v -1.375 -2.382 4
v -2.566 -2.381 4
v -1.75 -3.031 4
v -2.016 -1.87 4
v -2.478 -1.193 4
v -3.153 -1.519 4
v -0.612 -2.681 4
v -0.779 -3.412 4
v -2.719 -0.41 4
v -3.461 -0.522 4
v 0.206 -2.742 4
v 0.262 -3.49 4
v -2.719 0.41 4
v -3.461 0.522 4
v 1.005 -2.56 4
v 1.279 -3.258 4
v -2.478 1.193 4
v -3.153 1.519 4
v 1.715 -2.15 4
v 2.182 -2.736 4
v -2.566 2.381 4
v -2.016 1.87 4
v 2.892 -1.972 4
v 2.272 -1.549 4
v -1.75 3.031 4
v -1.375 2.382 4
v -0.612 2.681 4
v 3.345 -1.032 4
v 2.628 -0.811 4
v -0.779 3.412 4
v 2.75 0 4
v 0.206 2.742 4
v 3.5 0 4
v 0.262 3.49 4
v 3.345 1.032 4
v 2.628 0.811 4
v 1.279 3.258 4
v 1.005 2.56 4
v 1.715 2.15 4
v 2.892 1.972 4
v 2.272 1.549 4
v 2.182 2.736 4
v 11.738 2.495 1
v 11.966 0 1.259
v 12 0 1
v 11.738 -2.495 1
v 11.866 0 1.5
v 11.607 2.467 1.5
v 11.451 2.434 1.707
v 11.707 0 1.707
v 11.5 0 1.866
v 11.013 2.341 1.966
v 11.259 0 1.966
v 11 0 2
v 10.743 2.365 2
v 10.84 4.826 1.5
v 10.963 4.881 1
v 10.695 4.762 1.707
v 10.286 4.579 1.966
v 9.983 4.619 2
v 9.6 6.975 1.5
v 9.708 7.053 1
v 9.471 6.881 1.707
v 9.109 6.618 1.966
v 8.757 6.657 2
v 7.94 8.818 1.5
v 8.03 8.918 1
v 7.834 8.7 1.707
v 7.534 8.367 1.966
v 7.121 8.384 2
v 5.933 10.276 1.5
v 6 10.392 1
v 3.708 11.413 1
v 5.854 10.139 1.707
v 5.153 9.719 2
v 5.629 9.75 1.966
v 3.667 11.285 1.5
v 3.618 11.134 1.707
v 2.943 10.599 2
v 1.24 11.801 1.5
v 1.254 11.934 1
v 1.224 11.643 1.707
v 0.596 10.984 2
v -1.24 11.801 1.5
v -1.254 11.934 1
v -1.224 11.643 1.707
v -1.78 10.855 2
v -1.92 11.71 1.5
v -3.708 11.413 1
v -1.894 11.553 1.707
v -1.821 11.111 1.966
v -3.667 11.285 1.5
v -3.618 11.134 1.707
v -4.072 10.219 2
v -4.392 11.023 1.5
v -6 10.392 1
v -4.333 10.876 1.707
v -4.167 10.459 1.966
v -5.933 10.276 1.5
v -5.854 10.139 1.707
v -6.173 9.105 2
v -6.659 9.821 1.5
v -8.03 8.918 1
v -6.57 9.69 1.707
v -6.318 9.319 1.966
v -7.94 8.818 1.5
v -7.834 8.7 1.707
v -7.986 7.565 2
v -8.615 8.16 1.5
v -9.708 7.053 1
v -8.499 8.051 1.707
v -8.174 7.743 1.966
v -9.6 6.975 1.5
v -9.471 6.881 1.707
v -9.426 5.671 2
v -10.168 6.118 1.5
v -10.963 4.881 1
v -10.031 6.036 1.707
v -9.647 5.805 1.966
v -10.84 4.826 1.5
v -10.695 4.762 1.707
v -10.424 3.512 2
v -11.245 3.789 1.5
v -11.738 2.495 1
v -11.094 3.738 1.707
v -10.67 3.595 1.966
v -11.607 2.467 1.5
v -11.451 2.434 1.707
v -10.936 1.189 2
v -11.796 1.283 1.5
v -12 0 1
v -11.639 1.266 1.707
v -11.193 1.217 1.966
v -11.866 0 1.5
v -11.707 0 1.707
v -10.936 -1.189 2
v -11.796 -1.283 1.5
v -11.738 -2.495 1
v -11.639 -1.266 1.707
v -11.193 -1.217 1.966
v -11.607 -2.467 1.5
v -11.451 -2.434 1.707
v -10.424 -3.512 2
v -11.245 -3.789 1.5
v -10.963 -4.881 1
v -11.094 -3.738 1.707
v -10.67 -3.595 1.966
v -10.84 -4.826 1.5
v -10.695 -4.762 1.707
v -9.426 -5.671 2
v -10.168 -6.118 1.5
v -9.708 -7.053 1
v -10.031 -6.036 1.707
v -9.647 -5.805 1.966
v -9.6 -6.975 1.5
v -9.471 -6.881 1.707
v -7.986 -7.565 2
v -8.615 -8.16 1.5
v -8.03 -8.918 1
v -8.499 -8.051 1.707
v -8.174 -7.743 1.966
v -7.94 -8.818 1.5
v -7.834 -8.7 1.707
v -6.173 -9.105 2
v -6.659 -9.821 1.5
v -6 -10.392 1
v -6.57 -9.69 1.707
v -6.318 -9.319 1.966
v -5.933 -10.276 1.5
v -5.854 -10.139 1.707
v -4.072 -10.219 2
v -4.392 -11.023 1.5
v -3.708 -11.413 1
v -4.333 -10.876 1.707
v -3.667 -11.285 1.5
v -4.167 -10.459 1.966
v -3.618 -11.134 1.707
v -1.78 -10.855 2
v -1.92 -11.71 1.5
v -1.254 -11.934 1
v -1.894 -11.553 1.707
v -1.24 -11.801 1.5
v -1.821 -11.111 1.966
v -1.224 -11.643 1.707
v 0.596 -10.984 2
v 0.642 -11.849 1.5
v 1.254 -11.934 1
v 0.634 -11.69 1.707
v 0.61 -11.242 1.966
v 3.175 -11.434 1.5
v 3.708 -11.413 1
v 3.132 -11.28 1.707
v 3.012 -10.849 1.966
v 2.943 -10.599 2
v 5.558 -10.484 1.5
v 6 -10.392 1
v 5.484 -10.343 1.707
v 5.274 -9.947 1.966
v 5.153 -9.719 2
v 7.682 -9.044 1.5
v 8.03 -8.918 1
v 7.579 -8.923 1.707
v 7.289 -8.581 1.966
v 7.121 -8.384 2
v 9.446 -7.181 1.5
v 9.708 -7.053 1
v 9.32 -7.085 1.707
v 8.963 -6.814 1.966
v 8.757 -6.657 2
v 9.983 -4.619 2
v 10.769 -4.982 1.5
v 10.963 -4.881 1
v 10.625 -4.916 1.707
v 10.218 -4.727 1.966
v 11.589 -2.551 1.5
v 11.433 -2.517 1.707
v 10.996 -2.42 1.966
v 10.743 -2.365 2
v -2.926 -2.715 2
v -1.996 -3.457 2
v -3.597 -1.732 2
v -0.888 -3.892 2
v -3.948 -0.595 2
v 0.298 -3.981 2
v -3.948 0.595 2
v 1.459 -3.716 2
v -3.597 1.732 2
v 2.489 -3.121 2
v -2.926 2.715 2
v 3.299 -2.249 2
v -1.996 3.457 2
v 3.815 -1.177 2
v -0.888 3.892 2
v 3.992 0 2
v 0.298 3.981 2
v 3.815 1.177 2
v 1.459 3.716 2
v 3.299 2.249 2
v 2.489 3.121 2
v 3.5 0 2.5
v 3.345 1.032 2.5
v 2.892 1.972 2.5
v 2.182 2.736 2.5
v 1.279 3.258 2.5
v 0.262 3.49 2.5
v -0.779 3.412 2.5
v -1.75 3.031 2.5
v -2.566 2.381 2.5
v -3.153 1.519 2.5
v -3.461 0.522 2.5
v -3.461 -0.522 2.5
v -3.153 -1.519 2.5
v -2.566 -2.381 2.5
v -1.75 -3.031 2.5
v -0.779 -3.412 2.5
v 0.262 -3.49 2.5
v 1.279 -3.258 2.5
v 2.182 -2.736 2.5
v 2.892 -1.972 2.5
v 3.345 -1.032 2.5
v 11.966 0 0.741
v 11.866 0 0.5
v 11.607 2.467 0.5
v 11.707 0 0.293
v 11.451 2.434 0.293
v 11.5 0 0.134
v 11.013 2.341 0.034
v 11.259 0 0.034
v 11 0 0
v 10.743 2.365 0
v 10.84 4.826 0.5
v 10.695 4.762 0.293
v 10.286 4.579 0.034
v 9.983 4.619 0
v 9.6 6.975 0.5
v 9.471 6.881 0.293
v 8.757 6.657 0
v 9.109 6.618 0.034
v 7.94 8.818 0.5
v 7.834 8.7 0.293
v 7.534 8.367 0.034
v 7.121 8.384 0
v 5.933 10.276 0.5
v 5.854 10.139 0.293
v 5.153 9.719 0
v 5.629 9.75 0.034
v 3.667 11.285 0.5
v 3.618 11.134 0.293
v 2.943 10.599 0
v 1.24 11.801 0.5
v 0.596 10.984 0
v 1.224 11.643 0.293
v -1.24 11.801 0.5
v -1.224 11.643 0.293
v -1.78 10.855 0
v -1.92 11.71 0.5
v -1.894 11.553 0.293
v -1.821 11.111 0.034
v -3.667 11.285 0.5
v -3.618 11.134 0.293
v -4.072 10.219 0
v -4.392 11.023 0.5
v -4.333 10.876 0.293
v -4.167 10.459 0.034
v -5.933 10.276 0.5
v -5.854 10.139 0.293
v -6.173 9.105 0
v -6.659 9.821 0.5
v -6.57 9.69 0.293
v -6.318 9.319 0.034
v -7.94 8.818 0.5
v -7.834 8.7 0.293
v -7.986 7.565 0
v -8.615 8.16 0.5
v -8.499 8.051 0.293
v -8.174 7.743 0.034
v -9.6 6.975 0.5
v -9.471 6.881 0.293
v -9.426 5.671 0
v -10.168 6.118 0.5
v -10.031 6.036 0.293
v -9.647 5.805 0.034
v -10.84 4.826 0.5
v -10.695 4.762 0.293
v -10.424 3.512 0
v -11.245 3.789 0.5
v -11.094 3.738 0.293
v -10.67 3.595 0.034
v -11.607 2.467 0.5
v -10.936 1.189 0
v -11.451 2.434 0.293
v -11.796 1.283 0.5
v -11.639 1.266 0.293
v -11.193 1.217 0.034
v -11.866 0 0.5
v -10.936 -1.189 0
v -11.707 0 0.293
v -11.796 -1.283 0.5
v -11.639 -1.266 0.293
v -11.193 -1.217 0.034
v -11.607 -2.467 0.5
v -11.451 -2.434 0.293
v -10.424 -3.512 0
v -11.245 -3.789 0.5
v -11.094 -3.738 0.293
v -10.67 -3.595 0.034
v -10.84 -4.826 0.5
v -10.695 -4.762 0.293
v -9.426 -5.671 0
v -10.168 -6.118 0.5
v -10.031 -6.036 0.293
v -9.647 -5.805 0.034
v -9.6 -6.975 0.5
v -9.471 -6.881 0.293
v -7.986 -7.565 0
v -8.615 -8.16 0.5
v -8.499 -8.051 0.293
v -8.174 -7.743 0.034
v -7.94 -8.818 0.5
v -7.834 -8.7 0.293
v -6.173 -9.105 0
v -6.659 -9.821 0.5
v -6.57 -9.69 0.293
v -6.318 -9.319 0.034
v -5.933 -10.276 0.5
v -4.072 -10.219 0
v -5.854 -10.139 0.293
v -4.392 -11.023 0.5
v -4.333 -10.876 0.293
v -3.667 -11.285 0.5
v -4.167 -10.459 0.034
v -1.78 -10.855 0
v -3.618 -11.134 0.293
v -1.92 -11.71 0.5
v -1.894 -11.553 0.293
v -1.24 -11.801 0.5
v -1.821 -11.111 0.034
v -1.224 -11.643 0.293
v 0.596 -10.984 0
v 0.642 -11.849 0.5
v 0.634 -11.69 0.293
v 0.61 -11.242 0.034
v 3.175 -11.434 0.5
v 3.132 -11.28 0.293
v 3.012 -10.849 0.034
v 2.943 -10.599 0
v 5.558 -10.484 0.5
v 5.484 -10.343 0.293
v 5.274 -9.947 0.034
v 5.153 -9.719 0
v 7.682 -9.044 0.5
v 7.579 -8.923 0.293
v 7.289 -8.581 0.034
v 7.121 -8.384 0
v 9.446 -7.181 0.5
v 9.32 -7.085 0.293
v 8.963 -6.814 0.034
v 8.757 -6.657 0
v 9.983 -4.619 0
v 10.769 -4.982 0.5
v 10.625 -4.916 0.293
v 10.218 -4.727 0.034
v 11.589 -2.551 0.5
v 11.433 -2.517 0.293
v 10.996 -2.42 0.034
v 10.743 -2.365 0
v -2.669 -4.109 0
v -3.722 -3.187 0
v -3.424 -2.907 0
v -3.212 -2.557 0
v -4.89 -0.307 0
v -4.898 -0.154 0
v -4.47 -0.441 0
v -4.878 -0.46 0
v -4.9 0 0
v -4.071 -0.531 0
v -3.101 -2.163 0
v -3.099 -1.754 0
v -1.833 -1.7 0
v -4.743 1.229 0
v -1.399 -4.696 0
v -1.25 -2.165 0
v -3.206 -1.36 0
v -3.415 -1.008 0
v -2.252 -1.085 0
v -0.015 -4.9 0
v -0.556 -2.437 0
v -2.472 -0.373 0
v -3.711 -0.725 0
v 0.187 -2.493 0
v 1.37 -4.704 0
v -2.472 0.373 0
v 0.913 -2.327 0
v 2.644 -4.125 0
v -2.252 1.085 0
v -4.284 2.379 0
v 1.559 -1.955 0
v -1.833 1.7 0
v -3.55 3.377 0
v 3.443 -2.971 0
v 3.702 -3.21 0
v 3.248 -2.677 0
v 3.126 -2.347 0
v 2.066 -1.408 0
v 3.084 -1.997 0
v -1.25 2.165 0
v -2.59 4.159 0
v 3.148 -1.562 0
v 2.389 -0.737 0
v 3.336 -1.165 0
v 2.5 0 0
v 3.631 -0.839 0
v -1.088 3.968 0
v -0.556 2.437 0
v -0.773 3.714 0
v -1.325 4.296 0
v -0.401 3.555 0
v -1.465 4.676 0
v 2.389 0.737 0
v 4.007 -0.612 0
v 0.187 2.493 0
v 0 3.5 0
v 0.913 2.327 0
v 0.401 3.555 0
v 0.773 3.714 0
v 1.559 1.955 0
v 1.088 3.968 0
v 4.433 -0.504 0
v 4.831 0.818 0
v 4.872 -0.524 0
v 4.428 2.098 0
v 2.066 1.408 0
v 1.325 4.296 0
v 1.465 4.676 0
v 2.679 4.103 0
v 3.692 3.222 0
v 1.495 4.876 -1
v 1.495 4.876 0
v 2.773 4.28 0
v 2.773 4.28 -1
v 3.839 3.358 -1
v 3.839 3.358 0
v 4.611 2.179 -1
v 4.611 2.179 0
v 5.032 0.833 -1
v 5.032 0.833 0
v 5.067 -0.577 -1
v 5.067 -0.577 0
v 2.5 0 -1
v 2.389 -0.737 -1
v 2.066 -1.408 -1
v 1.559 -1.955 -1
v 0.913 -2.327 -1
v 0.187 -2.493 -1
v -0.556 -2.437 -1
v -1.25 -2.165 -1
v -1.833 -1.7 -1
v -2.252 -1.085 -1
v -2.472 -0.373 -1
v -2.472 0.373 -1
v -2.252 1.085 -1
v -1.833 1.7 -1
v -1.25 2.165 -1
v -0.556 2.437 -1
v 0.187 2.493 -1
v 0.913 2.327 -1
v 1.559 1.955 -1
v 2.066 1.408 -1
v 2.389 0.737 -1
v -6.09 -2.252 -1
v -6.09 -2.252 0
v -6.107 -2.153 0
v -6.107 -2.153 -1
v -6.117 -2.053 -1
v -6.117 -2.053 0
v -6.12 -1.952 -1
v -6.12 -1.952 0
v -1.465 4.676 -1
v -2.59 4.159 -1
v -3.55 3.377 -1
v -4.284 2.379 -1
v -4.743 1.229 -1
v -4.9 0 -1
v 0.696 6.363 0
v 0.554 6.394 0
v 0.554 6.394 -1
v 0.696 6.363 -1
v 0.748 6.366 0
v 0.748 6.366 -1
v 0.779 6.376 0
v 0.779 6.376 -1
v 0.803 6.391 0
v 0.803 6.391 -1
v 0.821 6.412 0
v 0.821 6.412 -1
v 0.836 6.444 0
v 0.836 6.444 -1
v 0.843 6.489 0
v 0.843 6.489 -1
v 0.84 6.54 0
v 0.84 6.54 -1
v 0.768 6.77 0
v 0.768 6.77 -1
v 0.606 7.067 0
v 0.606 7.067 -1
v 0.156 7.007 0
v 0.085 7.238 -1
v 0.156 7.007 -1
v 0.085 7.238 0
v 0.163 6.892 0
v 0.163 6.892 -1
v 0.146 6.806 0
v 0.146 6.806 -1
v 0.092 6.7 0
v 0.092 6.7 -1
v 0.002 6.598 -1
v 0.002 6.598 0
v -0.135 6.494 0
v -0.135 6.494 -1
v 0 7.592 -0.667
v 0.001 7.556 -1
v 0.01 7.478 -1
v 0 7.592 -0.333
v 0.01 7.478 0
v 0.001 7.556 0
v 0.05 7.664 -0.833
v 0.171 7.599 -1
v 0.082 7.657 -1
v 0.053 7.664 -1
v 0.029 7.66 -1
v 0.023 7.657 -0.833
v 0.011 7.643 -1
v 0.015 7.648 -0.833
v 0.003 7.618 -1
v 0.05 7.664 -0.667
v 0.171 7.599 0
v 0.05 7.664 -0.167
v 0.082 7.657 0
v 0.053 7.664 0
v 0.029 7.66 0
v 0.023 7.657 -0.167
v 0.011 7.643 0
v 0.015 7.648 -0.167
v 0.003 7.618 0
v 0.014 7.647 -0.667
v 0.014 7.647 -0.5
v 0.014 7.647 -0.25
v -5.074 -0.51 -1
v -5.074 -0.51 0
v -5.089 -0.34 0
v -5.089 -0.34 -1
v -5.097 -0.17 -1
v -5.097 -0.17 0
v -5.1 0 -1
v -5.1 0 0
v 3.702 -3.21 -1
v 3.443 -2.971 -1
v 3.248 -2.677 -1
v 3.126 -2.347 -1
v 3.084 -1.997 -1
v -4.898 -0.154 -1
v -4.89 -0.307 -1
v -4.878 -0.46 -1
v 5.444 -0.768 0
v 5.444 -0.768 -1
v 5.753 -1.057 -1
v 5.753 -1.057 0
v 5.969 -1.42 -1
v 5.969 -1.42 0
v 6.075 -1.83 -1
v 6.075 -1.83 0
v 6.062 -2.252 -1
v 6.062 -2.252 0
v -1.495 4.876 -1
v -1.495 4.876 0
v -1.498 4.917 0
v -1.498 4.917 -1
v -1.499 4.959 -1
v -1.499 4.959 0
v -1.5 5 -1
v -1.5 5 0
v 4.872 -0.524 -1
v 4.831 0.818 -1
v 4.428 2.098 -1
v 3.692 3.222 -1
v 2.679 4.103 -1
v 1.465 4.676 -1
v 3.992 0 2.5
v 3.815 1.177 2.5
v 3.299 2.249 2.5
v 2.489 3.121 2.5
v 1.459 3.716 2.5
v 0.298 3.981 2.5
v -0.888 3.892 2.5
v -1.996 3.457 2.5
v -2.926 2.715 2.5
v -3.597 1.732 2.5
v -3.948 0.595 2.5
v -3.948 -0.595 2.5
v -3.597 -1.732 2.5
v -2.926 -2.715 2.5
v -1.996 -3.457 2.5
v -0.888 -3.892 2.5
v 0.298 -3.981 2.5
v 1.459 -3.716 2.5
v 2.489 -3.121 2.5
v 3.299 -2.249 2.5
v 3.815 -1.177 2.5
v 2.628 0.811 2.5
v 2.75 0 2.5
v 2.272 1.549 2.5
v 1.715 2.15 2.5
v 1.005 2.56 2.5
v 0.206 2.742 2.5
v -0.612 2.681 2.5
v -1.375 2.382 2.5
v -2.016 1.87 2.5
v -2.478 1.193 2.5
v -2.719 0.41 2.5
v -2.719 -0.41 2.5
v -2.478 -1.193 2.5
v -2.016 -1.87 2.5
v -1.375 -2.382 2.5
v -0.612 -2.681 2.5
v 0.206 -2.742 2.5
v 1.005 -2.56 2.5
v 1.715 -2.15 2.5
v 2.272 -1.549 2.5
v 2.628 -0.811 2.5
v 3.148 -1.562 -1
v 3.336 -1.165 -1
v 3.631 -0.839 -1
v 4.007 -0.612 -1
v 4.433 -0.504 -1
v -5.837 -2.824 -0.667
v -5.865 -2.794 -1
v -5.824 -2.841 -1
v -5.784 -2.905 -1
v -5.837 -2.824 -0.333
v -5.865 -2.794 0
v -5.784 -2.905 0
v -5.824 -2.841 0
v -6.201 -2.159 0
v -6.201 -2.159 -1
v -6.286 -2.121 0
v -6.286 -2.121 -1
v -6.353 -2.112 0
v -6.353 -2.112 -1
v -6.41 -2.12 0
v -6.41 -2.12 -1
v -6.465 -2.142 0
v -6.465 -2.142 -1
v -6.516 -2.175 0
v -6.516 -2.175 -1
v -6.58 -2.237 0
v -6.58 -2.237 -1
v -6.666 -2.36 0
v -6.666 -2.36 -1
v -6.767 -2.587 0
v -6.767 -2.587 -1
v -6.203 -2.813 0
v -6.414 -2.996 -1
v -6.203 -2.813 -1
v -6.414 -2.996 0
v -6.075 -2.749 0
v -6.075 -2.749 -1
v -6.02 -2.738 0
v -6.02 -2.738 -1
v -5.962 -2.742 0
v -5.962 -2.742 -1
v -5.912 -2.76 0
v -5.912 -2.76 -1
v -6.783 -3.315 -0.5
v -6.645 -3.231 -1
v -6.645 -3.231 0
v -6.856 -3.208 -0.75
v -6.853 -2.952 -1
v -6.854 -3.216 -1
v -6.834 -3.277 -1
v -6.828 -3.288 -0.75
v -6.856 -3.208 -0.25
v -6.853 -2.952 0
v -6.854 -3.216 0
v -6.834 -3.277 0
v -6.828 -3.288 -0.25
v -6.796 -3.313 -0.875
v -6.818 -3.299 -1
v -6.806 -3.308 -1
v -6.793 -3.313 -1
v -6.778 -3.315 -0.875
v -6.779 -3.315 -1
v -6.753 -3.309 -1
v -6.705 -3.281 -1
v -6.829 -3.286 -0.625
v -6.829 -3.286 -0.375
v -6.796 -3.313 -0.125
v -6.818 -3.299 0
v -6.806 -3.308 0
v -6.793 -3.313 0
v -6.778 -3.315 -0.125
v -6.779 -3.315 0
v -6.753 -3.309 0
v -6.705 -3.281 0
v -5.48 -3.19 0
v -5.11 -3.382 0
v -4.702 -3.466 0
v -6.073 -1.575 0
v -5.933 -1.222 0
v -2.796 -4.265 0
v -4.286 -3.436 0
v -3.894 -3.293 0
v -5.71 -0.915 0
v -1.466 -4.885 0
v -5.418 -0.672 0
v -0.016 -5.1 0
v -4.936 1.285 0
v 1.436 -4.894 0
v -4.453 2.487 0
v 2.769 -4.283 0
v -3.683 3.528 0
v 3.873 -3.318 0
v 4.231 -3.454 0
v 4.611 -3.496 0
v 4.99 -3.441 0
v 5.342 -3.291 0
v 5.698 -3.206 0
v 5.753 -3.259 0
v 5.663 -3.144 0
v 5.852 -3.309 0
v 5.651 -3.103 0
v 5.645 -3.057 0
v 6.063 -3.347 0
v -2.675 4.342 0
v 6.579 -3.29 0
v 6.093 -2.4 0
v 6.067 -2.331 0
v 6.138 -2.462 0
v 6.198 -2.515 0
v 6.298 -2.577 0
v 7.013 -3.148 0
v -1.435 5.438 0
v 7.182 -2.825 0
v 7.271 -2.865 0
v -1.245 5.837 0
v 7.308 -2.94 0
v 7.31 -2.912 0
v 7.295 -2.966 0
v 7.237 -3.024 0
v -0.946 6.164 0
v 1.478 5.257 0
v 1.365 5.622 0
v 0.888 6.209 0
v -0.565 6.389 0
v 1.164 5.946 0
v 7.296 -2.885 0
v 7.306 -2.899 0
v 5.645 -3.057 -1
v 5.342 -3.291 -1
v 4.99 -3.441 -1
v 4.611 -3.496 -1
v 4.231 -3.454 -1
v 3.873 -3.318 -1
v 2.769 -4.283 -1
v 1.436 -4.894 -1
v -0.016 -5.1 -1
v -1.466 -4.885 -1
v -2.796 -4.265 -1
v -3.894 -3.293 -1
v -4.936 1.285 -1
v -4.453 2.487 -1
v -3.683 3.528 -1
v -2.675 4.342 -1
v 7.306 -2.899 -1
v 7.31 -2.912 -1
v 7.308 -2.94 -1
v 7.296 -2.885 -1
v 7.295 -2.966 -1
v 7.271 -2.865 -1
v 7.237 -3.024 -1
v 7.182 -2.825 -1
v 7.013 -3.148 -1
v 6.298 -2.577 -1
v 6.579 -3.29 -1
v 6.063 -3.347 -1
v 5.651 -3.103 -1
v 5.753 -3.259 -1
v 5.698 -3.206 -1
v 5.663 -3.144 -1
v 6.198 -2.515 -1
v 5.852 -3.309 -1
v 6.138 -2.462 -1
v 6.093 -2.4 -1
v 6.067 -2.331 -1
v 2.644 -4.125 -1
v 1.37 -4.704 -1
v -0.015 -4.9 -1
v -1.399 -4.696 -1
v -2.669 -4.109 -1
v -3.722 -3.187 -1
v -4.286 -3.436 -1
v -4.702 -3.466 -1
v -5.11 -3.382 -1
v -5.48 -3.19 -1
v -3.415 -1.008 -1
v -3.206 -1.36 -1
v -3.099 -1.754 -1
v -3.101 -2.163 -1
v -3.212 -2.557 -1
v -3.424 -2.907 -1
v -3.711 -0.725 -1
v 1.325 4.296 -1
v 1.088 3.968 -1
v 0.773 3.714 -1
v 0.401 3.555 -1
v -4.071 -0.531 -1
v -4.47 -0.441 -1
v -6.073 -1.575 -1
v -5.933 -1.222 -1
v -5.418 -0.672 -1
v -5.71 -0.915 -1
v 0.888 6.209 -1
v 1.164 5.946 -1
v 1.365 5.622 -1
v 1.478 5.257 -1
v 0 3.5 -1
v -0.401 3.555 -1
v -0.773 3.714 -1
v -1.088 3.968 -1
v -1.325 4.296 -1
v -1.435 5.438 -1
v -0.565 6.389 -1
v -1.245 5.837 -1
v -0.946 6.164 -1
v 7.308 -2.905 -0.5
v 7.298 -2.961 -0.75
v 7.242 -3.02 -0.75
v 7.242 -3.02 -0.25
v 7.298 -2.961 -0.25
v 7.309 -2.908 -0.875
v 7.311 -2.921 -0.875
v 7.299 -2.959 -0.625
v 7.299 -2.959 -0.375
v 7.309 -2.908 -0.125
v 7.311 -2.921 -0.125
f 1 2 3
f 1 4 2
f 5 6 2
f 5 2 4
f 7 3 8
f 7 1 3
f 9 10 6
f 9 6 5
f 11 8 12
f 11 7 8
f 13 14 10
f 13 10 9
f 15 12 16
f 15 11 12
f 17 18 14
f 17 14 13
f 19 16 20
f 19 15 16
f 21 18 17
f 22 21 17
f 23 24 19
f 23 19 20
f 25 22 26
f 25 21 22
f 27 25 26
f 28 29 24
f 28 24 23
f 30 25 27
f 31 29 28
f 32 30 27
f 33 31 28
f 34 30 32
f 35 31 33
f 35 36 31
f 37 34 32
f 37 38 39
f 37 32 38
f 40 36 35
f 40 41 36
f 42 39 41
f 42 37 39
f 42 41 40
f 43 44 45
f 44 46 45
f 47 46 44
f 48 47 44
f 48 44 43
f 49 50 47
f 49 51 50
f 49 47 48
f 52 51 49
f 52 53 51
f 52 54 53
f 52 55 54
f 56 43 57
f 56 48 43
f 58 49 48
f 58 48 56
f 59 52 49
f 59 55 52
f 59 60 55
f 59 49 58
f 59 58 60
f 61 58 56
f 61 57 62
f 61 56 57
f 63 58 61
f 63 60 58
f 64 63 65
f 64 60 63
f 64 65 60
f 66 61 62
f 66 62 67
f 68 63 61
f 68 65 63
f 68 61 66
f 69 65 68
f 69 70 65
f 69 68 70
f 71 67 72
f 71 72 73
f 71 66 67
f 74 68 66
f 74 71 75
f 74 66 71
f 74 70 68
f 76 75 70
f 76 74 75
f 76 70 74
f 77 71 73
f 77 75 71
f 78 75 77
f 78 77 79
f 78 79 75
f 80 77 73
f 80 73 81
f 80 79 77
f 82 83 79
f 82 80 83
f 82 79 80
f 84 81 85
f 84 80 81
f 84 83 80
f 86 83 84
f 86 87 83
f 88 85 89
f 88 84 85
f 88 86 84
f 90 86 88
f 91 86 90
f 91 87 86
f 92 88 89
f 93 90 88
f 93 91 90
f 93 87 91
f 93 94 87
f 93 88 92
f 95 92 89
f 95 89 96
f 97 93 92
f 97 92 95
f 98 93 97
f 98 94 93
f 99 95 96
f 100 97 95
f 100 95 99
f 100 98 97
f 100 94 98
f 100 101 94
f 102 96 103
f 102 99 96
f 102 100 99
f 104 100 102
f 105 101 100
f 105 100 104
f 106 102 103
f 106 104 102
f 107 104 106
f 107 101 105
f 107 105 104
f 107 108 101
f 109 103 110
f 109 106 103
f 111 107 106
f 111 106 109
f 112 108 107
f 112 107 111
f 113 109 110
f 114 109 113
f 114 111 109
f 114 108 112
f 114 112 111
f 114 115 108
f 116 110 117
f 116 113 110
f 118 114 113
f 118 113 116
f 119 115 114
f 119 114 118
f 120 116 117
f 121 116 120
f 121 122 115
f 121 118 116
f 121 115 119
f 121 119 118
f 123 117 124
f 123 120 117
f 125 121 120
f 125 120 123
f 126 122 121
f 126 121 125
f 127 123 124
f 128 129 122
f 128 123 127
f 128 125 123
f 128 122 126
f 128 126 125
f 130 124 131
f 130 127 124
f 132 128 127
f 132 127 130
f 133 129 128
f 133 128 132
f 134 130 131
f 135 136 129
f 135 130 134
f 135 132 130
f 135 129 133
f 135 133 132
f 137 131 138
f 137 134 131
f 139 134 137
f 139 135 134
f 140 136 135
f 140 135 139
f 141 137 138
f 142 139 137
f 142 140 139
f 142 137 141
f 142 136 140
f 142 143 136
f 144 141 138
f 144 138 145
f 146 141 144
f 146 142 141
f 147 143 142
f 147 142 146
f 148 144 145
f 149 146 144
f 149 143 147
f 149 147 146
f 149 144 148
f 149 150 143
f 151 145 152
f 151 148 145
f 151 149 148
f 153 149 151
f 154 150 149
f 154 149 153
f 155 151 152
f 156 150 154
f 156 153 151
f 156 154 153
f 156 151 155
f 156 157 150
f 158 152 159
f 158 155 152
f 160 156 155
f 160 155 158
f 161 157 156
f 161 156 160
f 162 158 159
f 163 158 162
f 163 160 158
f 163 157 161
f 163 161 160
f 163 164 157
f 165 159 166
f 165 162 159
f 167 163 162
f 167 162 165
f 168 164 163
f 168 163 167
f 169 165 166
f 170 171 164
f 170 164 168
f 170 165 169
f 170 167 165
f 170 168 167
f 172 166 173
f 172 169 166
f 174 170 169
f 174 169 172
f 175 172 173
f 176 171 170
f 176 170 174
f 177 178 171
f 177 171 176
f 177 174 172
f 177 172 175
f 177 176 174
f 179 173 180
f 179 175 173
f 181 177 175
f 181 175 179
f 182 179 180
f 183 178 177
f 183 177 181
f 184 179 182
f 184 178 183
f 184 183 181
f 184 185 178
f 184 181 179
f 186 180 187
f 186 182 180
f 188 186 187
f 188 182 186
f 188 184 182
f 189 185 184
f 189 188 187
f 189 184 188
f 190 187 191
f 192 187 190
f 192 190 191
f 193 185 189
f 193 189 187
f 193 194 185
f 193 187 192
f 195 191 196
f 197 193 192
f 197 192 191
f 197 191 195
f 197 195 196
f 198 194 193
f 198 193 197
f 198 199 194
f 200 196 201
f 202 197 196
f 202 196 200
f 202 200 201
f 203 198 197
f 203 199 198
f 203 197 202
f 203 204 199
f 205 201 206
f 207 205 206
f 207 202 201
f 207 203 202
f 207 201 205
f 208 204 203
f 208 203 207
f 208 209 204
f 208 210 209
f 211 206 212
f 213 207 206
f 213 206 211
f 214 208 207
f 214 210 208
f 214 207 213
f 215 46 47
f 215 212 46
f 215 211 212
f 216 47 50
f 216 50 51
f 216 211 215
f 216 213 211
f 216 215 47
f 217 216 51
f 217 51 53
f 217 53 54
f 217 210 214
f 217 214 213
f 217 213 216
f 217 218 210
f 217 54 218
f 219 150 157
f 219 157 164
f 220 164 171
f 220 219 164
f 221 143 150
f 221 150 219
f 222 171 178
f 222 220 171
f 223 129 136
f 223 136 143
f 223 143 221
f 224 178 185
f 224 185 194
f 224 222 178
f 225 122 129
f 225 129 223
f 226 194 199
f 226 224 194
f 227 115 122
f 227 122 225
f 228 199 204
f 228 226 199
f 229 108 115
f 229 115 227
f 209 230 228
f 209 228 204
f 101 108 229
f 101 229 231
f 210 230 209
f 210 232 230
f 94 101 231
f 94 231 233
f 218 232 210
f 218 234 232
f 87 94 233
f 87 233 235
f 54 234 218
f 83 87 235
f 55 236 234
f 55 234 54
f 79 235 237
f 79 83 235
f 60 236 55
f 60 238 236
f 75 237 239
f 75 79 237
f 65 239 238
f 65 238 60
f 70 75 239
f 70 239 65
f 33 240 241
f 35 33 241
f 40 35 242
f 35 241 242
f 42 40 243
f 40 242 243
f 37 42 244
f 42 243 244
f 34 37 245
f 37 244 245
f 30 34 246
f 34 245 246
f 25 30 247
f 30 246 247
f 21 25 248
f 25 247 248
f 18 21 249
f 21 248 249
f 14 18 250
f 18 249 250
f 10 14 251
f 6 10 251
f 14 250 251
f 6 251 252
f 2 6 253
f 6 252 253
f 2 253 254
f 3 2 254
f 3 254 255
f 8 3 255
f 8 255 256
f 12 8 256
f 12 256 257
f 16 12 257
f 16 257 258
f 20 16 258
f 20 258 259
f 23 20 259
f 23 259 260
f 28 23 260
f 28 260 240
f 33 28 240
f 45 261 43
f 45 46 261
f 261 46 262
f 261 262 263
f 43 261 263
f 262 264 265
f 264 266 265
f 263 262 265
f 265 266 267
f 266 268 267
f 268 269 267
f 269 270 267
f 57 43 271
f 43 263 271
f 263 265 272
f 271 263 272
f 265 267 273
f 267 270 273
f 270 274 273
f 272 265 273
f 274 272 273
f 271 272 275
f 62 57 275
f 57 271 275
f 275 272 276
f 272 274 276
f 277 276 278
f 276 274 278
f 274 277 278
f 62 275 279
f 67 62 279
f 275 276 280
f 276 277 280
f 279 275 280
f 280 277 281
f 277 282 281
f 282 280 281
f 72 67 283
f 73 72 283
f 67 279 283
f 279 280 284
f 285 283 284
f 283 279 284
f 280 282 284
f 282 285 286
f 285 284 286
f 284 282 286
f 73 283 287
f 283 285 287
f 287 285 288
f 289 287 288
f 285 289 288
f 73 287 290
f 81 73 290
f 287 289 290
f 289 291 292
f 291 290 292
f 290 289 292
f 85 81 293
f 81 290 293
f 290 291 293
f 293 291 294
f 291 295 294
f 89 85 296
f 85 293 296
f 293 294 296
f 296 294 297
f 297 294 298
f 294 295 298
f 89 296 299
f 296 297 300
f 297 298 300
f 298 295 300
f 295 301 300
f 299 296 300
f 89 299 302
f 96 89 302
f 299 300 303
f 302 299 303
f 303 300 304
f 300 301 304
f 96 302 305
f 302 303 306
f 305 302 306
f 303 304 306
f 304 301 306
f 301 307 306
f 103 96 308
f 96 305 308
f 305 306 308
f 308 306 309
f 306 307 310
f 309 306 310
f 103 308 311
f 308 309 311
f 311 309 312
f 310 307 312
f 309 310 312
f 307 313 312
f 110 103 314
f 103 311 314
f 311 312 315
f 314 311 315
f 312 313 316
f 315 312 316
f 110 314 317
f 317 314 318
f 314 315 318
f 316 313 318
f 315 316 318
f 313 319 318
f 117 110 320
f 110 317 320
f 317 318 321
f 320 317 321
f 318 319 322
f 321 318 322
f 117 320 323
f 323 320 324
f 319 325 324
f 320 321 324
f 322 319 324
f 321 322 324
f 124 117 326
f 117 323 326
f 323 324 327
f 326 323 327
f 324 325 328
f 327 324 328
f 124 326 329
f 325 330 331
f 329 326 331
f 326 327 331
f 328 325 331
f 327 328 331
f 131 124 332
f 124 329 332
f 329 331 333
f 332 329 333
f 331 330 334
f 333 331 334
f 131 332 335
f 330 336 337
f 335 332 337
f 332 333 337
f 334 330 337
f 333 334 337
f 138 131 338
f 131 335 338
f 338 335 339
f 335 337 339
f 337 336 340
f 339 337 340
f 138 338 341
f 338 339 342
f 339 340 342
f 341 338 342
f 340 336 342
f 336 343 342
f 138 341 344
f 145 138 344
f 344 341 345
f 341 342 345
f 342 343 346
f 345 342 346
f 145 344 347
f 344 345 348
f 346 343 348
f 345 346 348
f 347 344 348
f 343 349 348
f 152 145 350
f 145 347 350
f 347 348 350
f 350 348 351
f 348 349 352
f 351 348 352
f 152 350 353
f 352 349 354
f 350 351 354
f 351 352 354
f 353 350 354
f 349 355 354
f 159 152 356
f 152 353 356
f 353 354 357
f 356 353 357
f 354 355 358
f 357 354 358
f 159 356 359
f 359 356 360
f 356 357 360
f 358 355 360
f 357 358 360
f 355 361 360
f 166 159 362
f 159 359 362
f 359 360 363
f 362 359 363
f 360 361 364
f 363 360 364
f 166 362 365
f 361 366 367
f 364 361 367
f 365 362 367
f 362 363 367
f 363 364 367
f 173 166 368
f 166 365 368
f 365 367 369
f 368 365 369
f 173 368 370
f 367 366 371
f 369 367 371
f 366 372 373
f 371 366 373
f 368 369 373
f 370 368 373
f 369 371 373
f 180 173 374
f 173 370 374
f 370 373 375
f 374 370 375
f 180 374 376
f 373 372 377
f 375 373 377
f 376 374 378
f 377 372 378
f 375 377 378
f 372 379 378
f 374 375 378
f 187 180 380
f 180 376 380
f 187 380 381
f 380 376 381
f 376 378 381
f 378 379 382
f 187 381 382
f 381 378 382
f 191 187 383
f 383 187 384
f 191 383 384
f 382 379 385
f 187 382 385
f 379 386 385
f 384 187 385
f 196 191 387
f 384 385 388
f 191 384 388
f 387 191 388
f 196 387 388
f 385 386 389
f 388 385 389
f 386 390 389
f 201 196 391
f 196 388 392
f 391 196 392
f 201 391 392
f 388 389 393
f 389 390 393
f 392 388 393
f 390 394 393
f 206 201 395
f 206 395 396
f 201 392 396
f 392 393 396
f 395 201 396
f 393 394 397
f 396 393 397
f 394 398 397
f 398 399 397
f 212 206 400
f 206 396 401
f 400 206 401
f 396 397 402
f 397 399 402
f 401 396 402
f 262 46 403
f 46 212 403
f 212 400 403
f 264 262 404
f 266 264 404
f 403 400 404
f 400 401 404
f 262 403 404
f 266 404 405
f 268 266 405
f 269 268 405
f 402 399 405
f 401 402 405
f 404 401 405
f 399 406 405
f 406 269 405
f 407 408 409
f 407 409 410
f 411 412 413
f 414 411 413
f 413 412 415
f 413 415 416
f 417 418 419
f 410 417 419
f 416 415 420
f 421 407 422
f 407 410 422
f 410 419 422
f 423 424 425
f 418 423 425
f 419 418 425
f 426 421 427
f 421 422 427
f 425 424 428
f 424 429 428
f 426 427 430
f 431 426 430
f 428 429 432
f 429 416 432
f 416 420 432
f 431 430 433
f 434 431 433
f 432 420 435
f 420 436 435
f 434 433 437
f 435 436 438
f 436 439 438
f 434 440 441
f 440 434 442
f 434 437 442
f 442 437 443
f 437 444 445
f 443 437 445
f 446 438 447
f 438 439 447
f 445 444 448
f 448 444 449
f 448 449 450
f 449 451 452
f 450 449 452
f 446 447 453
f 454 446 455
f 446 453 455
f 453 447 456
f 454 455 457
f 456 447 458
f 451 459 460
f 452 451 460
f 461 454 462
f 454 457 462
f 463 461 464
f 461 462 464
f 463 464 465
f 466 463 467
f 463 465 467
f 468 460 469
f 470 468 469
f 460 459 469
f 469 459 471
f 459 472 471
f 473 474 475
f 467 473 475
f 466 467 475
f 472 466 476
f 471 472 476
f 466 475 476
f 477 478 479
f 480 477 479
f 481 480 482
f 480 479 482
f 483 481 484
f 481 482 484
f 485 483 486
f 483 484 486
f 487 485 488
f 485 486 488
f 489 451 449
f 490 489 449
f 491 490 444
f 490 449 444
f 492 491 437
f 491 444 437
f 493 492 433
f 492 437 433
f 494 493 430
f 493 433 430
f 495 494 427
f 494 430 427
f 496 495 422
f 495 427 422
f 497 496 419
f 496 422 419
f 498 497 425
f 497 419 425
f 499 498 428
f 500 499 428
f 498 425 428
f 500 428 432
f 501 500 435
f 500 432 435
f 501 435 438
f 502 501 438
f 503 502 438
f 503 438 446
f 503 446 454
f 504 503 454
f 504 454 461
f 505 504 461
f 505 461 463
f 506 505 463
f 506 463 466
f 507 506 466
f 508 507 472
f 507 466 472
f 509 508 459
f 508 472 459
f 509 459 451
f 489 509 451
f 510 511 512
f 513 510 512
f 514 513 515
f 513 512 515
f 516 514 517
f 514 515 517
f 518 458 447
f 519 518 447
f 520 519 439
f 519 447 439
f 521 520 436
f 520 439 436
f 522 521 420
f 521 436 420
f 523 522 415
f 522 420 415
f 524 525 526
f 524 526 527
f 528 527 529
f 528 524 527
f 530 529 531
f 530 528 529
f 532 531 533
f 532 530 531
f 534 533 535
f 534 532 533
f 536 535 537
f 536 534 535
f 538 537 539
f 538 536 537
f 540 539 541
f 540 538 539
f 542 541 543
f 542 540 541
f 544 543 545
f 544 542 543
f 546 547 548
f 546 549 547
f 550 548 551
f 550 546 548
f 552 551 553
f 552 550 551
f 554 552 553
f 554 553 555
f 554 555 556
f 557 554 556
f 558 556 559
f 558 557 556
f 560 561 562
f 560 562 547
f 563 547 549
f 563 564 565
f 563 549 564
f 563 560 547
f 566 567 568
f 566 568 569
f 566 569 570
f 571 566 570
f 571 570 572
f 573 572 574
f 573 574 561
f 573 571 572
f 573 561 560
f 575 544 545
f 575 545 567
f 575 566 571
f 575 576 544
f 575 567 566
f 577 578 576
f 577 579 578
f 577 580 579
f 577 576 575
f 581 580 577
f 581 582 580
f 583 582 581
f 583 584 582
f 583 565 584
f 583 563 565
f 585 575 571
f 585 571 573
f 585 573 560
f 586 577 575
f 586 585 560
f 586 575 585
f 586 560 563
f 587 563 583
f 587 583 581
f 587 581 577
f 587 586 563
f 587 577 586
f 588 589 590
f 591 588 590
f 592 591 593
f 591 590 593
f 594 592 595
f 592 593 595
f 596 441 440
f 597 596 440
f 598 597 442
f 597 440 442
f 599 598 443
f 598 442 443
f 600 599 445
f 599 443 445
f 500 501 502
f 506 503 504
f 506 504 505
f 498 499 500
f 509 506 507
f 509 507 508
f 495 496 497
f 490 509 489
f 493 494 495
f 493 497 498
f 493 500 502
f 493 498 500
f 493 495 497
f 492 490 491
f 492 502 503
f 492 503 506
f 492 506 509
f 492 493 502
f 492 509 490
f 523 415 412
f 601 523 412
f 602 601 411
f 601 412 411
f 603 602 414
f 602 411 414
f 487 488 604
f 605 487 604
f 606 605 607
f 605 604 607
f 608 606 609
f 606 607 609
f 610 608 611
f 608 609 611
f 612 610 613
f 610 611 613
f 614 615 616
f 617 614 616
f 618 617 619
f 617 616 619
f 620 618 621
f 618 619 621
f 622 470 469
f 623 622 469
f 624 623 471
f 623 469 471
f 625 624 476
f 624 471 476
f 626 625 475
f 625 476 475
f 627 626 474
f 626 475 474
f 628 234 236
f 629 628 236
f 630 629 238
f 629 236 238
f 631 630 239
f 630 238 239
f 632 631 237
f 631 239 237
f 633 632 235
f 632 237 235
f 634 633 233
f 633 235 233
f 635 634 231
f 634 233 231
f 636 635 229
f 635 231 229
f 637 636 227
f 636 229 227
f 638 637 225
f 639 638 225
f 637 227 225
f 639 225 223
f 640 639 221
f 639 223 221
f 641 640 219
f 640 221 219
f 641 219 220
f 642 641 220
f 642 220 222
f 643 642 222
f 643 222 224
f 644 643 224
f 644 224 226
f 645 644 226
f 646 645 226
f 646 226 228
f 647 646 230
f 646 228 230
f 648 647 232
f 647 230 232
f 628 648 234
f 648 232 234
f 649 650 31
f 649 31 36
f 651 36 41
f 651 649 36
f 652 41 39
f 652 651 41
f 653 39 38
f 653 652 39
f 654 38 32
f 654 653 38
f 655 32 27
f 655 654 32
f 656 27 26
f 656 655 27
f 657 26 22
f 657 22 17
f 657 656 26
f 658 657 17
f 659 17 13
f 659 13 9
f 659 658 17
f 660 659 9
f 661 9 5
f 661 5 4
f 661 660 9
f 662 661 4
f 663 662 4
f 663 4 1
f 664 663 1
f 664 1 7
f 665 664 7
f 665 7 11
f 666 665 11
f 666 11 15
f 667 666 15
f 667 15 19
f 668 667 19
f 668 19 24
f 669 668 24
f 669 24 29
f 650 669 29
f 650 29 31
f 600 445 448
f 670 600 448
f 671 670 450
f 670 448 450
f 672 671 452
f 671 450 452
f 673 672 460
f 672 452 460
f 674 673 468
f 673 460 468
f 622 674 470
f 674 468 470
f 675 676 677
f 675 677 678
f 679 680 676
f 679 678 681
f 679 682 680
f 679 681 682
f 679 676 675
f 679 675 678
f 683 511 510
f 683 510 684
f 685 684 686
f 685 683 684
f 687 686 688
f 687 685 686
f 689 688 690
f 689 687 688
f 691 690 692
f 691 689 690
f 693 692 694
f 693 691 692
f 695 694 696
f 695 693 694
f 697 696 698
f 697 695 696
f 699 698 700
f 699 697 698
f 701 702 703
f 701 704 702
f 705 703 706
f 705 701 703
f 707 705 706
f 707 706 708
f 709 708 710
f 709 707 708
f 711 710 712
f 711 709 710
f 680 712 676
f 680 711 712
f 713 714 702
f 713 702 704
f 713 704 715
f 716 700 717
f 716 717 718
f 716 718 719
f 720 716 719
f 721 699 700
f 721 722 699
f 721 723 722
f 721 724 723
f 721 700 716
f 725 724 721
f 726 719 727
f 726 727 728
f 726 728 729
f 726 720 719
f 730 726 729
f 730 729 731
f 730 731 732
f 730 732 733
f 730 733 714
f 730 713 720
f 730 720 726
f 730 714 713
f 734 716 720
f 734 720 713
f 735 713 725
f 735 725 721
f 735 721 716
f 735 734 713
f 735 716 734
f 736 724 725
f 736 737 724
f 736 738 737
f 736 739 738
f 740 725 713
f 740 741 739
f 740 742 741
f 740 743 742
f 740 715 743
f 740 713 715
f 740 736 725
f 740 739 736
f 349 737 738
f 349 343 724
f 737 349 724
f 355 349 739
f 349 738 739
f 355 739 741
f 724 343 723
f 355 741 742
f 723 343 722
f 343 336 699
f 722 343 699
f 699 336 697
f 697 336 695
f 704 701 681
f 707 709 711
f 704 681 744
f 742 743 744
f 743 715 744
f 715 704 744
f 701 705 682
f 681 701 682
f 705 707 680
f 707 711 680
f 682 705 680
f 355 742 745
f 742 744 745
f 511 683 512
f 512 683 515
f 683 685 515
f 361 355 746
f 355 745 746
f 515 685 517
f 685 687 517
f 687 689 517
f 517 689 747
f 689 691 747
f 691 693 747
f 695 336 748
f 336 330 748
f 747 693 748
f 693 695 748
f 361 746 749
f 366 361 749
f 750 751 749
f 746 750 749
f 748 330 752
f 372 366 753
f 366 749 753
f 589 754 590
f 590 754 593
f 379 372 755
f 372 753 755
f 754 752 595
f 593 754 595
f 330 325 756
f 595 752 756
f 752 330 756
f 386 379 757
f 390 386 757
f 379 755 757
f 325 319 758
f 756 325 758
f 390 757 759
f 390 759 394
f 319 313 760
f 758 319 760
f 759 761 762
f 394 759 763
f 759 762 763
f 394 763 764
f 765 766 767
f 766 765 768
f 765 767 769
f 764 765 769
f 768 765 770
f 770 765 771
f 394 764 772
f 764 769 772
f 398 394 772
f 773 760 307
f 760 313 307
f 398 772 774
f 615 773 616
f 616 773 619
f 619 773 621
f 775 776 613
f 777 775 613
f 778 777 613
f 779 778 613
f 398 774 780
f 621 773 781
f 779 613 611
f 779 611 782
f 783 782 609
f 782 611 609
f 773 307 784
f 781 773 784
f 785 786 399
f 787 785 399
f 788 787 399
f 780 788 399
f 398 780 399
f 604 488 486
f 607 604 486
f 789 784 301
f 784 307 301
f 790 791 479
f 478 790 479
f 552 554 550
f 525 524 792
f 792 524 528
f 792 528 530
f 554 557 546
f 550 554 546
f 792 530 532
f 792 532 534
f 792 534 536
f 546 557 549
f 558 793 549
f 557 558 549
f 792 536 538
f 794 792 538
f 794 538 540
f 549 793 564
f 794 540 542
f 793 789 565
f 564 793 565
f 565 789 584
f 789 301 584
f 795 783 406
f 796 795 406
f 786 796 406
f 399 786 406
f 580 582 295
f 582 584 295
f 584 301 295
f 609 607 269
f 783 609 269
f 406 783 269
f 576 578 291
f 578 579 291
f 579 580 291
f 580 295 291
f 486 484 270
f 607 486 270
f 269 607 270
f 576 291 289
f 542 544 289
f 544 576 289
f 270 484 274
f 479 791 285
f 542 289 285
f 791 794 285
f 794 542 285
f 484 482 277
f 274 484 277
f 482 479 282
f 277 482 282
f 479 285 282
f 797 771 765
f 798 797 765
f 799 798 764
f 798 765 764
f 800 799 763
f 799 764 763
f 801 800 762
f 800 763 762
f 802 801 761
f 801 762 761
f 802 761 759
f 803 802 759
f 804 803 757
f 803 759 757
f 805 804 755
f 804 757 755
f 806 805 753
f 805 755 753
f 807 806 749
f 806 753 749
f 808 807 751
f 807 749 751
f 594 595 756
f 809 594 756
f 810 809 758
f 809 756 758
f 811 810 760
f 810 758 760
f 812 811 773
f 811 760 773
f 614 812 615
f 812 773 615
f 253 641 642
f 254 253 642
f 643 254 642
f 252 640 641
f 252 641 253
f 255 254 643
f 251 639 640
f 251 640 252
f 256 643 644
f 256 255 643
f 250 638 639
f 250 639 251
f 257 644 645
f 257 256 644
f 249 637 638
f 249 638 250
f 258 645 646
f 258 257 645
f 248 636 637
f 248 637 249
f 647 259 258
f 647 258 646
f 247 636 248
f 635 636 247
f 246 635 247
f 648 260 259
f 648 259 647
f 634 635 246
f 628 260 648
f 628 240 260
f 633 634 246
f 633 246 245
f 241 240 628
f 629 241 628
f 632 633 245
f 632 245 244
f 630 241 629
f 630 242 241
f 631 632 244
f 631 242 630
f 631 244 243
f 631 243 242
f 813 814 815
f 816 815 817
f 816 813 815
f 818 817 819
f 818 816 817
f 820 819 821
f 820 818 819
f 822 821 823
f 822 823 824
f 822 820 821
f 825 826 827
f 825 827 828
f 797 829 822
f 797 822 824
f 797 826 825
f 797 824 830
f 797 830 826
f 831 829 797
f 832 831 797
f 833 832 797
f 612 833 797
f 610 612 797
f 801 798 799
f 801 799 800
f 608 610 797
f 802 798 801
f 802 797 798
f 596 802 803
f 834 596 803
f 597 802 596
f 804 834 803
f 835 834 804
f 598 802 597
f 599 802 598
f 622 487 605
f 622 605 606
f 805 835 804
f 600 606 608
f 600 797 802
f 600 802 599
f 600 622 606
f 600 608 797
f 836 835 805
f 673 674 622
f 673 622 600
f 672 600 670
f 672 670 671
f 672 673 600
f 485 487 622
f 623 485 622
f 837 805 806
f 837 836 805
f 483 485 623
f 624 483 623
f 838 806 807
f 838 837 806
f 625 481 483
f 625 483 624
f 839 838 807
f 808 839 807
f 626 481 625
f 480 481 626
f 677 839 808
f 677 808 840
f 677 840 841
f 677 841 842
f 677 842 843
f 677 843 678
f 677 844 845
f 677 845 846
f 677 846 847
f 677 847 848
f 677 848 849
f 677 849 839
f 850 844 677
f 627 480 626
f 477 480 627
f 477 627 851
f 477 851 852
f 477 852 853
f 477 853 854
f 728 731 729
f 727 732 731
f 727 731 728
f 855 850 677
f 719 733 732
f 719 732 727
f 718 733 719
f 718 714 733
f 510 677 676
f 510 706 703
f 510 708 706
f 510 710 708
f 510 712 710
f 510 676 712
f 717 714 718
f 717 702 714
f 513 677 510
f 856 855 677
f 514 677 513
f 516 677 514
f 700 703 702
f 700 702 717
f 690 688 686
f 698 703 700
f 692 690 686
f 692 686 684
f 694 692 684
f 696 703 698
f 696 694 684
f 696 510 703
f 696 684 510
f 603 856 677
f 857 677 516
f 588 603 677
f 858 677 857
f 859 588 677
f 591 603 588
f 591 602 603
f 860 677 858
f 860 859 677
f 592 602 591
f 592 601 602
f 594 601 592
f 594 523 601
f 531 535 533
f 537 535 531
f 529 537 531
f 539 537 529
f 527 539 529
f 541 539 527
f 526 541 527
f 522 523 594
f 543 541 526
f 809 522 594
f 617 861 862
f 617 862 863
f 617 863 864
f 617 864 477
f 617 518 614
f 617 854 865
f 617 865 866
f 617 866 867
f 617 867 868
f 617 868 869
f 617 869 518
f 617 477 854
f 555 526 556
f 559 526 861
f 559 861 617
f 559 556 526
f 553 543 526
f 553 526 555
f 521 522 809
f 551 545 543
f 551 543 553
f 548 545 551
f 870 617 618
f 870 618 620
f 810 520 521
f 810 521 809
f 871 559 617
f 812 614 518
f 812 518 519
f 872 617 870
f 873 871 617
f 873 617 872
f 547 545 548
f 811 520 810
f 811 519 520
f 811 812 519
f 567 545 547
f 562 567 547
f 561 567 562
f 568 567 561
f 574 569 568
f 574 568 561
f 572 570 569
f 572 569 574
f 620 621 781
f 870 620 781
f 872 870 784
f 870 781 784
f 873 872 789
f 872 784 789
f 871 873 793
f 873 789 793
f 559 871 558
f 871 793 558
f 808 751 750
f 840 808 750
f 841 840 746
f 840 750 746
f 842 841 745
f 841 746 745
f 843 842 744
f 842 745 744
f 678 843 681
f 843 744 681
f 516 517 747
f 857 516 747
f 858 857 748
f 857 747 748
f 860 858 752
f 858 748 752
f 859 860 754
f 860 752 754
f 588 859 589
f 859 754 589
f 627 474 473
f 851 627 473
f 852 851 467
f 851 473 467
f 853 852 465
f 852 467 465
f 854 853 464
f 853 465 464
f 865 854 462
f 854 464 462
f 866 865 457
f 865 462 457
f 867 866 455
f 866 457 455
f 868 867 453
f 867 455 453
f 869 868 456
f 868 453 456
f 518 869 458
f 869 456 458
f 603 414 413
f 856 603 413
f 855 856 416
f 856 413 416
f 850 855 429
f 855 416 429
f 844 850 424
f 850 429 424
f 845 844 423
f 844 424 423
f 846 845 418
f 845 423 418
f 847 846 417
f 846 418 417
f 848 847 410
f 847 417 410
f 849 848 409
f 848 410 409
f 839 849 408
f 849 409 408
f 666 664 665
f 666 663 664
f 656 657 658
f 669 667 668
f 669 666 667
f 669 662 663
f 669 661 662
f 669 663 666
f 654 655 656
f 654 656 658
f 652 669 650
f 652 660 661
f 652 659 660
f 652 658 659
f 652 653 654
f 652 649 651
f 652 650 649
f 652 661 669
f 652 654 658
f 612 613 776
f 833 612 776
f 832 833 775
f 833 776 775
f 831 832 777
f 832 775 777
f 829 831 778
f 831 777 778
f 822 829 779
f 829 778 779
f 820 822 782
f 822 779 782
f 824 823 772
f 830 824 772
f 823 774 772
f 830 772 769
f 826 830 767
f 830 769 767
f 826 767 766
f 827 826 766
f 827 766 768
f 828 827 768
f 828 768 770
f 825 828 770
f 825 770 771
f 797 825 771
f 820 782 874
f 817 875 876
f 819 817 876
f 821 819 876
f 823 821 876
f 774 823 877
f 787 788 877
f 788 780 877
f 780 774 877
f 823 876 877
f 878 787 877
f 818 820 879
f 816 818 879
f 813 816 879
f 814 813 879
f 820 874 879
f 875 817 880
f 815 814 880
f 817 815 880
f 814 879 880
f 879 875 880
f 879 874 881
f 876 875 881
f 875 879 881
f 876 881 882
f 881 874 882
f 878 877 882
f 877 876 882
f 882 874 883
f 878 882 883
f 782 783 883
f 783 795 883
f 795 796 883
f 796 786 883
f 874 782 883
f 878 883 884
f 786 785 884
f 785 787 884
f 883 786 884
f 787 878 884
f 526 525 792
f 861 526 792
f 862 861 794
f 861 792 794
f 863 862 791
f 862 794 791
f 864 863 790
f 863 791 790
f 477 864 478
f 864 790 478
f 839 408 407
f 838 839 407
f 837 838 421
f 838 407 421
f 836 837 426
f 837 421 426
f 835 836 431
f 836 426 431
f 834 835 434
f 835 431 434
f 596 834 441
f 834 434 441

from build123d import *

# Parameters (mm, degrees)
SKETCH1_R           = 12
BOSS_EXTRUDE1_DEPTH = 2
SKETCH2_R           = 3.5
SKETCH2_R_2         = 2.75
BOSS_EXTRUDE2_DEPTH = 2
FILLET1_R           = 1
SKETCH3_R           = 2.5
BOSS_EXTRUDE3_DEPTH = 1
SKETCH4_R           = 3.992210858
BOSS_EXTRUDE4_DEPTH = 0.5


with BuildPart() as part:
    # Sketch1 → Boss-Extrude1 (new body)
    with BuildSketch(Plane.XY):
        Circle(SKETCH1_R)
    extrude(amount=BOSS_EXTRUDE1_DEPTH)

    # Sketch2 → Boss-Extrude2 (add)
    with BuildSketch(Plane.XY.offset(2)):
        Circle(SKETCH2_R)
        Circle(SKETCH2_R_2, mode=Mode.SUBTRACT)
    extrude(amount=BOSS_EXTRUDE2_DEPTH)

    # Fillet1
    fillet1_edges = [part.edges().sort_by_distance(p)[0] for p in [
        (-12, 0, 0),
        (-12, 0, 2),
    ]]
    fillet(fillet1_edges, radius=FILLET1_R - 0.0001)  # a hair under: the kernel refuses the full size

    # Sketch3 → Boss-Extrude3 (add)
    with BuildSketch(Plane(origin=(0, 0, 0), x_dir=(-1, 0, 0), z_dir=(0, 0, -1))):
        with Locations(Location((0, 0, 0), (0, 0, 180))):
            Circle(SKETCH3_R)
        with BuildLine():
            ThreePointArc((-5.067307925, -0.57653308), (-5.873937117, -1.230891086), (-6.062099925, -2.252375207))
            ThreePointArc((-6.062099925, -2.252375207), (-5.915680958, -2.687087026), (-5.644734338, -3.057223228))
            ThreePointArc((-5.644734338, -3.057223228), (-4.802200561, -3.480618607), (-3.873470329, -3.317563506))
            ThreePointArc((-3.873470329, -3.317563506), (-4.675755649, -2.036494318), (-5.067307925, -0.57653308))
        make_face()
        with BuildLine():
            ThreePointArc((-5.644734338, -3.057223228), (-5.915680958, -2.687087026), (-6.062099925, -2.252375207))
            add(Edge.make_bspline(
                [(-6.062099925, -2.252375207), (-6.026517589, -2.751047072), (-8.759907871, -2.687863498), (-5.681591245, -3.687002551), (-5.644734338, -3.057223228)],
                knots=[0, 0, 0, 0, 0.44427951, 1, 1, 1, 1], degree=3))
        make_face()
        with BuildLine():
            ThreePointArc((-1.49486588, 4.876), (-4.265918484, 2.794984703), (-5.067307925, -0.57653308))
            ThreePointArc((-5.067307925, -0.57653308), (-4.970460995, -0.547182079), (-4.871855436, -0.524427893))
            ThreePointArc((-4.871855436, -0.524427893), (-4.098627563, 2.68537746), (-1.464590045, 4.676))
            ThreePointArc((-1.464590045, 4.676), (-1.483103113, 4.775489073), (-1.49486588, 4.876))
        make_face()
        with BuildLine():
            ThreePointArc((-4.871855436, -0.524427893), (-4.970460995, -0.547182079), (-5.067307925, -0.57653308))
            ThreePointArc((-5.067307925, -0.57653308), (-4.675755649, -2.036494318), (-3.873470329, -3.317563506))
            ThreePointArc((-3.873470329, -3.317563506), (-3.786017441, -3.266643945), (-3.702196885, -3.209943649))
            ThreePointArc((-3.702196885, -3.209943649), (-4.492392683, -1.956631796), (-4.871855436, -0.524427893))
        make_face()
        with BuildLine():
            ThreePointArc((-3.702196885, -3.209943649), (-3.786017441, -3.266643945), (-3.873470329, -3.317563506))
            ThreePointArc((-3.873470329, -3.317563506), (0.01581793, -5.09997547), (3.893974917, -3.293472232))
            ThreePointArc((3.893974917, -3.293472232), (3.806118362, -3.243200717), (3.721809355, -3.187182945))
            ThreePointArc((3.721809355, -3.187182945), (0.015022472, -4.899976972), (-3.702196885, -3.209943649))
        make_face()
        with BuildLine():
            ThreePointArc((-3.084074166, -1.996563057), (-3.630573223, -0.838618346), (-4.871855436, -0.524427893))
            ThreePointArc((-4.871855436, -0.524427893), (-4.492392683, -1.956631796), (-3.702196885, -3.209943649))
            ThreePointArc((-3.702196885, -3.209943649), (-3.247508432, -2.677438992), (-3.084074166, -1.996563057))
        make_face()
        with BuildLine():
            ThreePointArc((1.49486588, 4.876), (0, 5.1), (-1.49486588, 4.876))
            ThreePointArc((-1.49486588, 4.876), (-1.483103113, 4.775489073), (-1.464590045, 4.676))
            ThreePointArc((-1.464590045, 4.676), (0, 4.9), (1.464590045, 4.676))
            ThreePointArc((1.464590045, 4.676), (1.483103113, 4.775489073), (1.49486588, 4.876))
        make_face()
        with BuildLine():
            ThreePointArc((-0.554469126, 6.393758942), (-1.275084916, 5.790036997), (-1.49486588, 4.876))
            ThreePointArc((-1.49486588, 4.876), (0, 5.1), (1.49486588, 4.876))
            ThreePointArc((1.49486588, 4.876), (1.49871592, 4.937946879), (1.5, 5))
            ThreePointArc((1.5, 5), (1.10747264, 6.011683919), (0.135327531, 6.493883014))
            ThreePointArc((0.135327531, 6.493883014), (-0.215467229, 6.484443961), (-0.554469126, 6.393758942))
        make_face()
        with BuildLine():
            ThreePointArc((5.074434577, -0.510013455), (4.695210635, -1.991230046), (3.893974917, -3.293472232))
            ThreePointArc((3.893974917, -3.293472232), (4.908886749, -3.438287773), (5.784206585, -2.904590527))
            add(Edge.make_bspline(
                [(5.865406446, -2.794015708), (5.836751545, -2.820305024), (5.809552866, -2.856598637), (5.784206585, -2.904590527)],
                knots=[0.961955758, 0.961955758, 0.961955758, 0.961955758, 1, 1, 1, 1], degree=3))
            ThreePointArc((5.865406446, -2.794015708), (6.004314758, -2.534169766), (6.090380192, -2.252375207))
            ThreePointArc((6.090380192, -2.252375207), (6.112856484, -2.103028092), (6.120373409, -1.952186319))
            ThreePointArc((6.120373409, -1.952186319), (5.831362343, -1.061421113), (5.074434577, -0.510013455))
        make_face()
        with BuildLine():
            ThreePointArc((3.721809355, -3.187182945), (3.806118362, -3.243200717), (3.893974917, -3.293472232))
            ThreePointArc((3.893974917, -3.293472232), (4.695210635, -1.991230046), (5.074434577, -0.510013455))
            ThreePointArc((5.074434577, -0.510013455), (4.97722395, -0.481798325), (4.878348324, -0.460127837))
            ThreePointArc((4.878348324, -0.460127837), (4.511084728, -1.913142593), (3.721809355, -3.187182945))
        make_face()
        with BuildLine():
            ThreePointArc((1.464590045, 4.676), (0, 4.9), (-1.464590045, 4.676))
            ThreePointArc((-1.464590045, 4.676), (0, 3.5), (1.464590045, 4.676))
        make_face()
        with BuildLine():
            add(Edge.make_bspline(
                [(-0.554469126, 6.393758942), (-1.437590662, 6.09502869), (0.002600213, 8.079848895), (-0.001852582, 7.193488902), (-0.442267062, 6.868197163), (0.135327531, 6.493883014)],
                knots=[0, 0, 0, 0, 0.556265111, 0.561970103, 1, 1, 1, 1], degree=3))
            ThreePointArc((-0.554469126, 6.393758942), (-0.215467229, 6.484443961), (0.135327531, 6.493883014))
        make_face()
        with BuildLine():
            ThreePointArc((5.1, 0), (4.100842352, 3.032011215), (1.49486588, 4.876))
            ThreePointArc((1.49486588, 4.876), (1.483103113, 4.775489073), (1.464590045, 4.676))
            ThreePointArc((1.464590045, 4.676), (3.948828385, 2.901164316), (4.9, 0))
            ThreePointArc((4.9, 0), (4.894584088, -0.230318487), (4.878348324, -0.460127837))
            ThreePointArc((4.878348324, -0.460127837), (4.97722395, -0.481798325), (5.074434577, -0.510013455))
            ThreePointArc((5.074434577, -0.510013455), (5.093604634, -0.255326906), (5.1, 0))
        make_face()
        with BuildLine():
            ThreePointArc((4.878348324, -0.460127837), (3.206344863, -1.359804857), (3.721809355, -3.187182945))
            ThreePointArc((3.721809355, -3.187182945), (4.511084728, -1.913142593), (4.878348324, -0.460127837))
        make_face()
        with BuildLine():
            ThreePointArc((6.090380192, -2.252375207), (6.004314758, -2.534169766), (5.865406446, -2.794015708))
            add(Edge.make_bspline(
                [(6.090380192, -2.252375207), (6.684980611, -1.62456302), (7.266645295, -4.471941038), (6.161555953, -2.52231461), (5.865406446, -2.794015708)],
                knots=[0, 0, 0, 0, 0.568767056, 0.961955758, 0.961955758, 0.961955758, 0.961955758], degree=3))
        make_face()
    extrude(amount=BOSS_EXTRUDE3_DEPTH)

    # Sketch4 → Boss-Extrude4 (add)
    with BuildSketch(Plane.XY.offset(2)):
        Circle(SKETCH4_R)
    extrude(amount=BOSS_EXTRUDE4_DEPTH)


solid = part.part
